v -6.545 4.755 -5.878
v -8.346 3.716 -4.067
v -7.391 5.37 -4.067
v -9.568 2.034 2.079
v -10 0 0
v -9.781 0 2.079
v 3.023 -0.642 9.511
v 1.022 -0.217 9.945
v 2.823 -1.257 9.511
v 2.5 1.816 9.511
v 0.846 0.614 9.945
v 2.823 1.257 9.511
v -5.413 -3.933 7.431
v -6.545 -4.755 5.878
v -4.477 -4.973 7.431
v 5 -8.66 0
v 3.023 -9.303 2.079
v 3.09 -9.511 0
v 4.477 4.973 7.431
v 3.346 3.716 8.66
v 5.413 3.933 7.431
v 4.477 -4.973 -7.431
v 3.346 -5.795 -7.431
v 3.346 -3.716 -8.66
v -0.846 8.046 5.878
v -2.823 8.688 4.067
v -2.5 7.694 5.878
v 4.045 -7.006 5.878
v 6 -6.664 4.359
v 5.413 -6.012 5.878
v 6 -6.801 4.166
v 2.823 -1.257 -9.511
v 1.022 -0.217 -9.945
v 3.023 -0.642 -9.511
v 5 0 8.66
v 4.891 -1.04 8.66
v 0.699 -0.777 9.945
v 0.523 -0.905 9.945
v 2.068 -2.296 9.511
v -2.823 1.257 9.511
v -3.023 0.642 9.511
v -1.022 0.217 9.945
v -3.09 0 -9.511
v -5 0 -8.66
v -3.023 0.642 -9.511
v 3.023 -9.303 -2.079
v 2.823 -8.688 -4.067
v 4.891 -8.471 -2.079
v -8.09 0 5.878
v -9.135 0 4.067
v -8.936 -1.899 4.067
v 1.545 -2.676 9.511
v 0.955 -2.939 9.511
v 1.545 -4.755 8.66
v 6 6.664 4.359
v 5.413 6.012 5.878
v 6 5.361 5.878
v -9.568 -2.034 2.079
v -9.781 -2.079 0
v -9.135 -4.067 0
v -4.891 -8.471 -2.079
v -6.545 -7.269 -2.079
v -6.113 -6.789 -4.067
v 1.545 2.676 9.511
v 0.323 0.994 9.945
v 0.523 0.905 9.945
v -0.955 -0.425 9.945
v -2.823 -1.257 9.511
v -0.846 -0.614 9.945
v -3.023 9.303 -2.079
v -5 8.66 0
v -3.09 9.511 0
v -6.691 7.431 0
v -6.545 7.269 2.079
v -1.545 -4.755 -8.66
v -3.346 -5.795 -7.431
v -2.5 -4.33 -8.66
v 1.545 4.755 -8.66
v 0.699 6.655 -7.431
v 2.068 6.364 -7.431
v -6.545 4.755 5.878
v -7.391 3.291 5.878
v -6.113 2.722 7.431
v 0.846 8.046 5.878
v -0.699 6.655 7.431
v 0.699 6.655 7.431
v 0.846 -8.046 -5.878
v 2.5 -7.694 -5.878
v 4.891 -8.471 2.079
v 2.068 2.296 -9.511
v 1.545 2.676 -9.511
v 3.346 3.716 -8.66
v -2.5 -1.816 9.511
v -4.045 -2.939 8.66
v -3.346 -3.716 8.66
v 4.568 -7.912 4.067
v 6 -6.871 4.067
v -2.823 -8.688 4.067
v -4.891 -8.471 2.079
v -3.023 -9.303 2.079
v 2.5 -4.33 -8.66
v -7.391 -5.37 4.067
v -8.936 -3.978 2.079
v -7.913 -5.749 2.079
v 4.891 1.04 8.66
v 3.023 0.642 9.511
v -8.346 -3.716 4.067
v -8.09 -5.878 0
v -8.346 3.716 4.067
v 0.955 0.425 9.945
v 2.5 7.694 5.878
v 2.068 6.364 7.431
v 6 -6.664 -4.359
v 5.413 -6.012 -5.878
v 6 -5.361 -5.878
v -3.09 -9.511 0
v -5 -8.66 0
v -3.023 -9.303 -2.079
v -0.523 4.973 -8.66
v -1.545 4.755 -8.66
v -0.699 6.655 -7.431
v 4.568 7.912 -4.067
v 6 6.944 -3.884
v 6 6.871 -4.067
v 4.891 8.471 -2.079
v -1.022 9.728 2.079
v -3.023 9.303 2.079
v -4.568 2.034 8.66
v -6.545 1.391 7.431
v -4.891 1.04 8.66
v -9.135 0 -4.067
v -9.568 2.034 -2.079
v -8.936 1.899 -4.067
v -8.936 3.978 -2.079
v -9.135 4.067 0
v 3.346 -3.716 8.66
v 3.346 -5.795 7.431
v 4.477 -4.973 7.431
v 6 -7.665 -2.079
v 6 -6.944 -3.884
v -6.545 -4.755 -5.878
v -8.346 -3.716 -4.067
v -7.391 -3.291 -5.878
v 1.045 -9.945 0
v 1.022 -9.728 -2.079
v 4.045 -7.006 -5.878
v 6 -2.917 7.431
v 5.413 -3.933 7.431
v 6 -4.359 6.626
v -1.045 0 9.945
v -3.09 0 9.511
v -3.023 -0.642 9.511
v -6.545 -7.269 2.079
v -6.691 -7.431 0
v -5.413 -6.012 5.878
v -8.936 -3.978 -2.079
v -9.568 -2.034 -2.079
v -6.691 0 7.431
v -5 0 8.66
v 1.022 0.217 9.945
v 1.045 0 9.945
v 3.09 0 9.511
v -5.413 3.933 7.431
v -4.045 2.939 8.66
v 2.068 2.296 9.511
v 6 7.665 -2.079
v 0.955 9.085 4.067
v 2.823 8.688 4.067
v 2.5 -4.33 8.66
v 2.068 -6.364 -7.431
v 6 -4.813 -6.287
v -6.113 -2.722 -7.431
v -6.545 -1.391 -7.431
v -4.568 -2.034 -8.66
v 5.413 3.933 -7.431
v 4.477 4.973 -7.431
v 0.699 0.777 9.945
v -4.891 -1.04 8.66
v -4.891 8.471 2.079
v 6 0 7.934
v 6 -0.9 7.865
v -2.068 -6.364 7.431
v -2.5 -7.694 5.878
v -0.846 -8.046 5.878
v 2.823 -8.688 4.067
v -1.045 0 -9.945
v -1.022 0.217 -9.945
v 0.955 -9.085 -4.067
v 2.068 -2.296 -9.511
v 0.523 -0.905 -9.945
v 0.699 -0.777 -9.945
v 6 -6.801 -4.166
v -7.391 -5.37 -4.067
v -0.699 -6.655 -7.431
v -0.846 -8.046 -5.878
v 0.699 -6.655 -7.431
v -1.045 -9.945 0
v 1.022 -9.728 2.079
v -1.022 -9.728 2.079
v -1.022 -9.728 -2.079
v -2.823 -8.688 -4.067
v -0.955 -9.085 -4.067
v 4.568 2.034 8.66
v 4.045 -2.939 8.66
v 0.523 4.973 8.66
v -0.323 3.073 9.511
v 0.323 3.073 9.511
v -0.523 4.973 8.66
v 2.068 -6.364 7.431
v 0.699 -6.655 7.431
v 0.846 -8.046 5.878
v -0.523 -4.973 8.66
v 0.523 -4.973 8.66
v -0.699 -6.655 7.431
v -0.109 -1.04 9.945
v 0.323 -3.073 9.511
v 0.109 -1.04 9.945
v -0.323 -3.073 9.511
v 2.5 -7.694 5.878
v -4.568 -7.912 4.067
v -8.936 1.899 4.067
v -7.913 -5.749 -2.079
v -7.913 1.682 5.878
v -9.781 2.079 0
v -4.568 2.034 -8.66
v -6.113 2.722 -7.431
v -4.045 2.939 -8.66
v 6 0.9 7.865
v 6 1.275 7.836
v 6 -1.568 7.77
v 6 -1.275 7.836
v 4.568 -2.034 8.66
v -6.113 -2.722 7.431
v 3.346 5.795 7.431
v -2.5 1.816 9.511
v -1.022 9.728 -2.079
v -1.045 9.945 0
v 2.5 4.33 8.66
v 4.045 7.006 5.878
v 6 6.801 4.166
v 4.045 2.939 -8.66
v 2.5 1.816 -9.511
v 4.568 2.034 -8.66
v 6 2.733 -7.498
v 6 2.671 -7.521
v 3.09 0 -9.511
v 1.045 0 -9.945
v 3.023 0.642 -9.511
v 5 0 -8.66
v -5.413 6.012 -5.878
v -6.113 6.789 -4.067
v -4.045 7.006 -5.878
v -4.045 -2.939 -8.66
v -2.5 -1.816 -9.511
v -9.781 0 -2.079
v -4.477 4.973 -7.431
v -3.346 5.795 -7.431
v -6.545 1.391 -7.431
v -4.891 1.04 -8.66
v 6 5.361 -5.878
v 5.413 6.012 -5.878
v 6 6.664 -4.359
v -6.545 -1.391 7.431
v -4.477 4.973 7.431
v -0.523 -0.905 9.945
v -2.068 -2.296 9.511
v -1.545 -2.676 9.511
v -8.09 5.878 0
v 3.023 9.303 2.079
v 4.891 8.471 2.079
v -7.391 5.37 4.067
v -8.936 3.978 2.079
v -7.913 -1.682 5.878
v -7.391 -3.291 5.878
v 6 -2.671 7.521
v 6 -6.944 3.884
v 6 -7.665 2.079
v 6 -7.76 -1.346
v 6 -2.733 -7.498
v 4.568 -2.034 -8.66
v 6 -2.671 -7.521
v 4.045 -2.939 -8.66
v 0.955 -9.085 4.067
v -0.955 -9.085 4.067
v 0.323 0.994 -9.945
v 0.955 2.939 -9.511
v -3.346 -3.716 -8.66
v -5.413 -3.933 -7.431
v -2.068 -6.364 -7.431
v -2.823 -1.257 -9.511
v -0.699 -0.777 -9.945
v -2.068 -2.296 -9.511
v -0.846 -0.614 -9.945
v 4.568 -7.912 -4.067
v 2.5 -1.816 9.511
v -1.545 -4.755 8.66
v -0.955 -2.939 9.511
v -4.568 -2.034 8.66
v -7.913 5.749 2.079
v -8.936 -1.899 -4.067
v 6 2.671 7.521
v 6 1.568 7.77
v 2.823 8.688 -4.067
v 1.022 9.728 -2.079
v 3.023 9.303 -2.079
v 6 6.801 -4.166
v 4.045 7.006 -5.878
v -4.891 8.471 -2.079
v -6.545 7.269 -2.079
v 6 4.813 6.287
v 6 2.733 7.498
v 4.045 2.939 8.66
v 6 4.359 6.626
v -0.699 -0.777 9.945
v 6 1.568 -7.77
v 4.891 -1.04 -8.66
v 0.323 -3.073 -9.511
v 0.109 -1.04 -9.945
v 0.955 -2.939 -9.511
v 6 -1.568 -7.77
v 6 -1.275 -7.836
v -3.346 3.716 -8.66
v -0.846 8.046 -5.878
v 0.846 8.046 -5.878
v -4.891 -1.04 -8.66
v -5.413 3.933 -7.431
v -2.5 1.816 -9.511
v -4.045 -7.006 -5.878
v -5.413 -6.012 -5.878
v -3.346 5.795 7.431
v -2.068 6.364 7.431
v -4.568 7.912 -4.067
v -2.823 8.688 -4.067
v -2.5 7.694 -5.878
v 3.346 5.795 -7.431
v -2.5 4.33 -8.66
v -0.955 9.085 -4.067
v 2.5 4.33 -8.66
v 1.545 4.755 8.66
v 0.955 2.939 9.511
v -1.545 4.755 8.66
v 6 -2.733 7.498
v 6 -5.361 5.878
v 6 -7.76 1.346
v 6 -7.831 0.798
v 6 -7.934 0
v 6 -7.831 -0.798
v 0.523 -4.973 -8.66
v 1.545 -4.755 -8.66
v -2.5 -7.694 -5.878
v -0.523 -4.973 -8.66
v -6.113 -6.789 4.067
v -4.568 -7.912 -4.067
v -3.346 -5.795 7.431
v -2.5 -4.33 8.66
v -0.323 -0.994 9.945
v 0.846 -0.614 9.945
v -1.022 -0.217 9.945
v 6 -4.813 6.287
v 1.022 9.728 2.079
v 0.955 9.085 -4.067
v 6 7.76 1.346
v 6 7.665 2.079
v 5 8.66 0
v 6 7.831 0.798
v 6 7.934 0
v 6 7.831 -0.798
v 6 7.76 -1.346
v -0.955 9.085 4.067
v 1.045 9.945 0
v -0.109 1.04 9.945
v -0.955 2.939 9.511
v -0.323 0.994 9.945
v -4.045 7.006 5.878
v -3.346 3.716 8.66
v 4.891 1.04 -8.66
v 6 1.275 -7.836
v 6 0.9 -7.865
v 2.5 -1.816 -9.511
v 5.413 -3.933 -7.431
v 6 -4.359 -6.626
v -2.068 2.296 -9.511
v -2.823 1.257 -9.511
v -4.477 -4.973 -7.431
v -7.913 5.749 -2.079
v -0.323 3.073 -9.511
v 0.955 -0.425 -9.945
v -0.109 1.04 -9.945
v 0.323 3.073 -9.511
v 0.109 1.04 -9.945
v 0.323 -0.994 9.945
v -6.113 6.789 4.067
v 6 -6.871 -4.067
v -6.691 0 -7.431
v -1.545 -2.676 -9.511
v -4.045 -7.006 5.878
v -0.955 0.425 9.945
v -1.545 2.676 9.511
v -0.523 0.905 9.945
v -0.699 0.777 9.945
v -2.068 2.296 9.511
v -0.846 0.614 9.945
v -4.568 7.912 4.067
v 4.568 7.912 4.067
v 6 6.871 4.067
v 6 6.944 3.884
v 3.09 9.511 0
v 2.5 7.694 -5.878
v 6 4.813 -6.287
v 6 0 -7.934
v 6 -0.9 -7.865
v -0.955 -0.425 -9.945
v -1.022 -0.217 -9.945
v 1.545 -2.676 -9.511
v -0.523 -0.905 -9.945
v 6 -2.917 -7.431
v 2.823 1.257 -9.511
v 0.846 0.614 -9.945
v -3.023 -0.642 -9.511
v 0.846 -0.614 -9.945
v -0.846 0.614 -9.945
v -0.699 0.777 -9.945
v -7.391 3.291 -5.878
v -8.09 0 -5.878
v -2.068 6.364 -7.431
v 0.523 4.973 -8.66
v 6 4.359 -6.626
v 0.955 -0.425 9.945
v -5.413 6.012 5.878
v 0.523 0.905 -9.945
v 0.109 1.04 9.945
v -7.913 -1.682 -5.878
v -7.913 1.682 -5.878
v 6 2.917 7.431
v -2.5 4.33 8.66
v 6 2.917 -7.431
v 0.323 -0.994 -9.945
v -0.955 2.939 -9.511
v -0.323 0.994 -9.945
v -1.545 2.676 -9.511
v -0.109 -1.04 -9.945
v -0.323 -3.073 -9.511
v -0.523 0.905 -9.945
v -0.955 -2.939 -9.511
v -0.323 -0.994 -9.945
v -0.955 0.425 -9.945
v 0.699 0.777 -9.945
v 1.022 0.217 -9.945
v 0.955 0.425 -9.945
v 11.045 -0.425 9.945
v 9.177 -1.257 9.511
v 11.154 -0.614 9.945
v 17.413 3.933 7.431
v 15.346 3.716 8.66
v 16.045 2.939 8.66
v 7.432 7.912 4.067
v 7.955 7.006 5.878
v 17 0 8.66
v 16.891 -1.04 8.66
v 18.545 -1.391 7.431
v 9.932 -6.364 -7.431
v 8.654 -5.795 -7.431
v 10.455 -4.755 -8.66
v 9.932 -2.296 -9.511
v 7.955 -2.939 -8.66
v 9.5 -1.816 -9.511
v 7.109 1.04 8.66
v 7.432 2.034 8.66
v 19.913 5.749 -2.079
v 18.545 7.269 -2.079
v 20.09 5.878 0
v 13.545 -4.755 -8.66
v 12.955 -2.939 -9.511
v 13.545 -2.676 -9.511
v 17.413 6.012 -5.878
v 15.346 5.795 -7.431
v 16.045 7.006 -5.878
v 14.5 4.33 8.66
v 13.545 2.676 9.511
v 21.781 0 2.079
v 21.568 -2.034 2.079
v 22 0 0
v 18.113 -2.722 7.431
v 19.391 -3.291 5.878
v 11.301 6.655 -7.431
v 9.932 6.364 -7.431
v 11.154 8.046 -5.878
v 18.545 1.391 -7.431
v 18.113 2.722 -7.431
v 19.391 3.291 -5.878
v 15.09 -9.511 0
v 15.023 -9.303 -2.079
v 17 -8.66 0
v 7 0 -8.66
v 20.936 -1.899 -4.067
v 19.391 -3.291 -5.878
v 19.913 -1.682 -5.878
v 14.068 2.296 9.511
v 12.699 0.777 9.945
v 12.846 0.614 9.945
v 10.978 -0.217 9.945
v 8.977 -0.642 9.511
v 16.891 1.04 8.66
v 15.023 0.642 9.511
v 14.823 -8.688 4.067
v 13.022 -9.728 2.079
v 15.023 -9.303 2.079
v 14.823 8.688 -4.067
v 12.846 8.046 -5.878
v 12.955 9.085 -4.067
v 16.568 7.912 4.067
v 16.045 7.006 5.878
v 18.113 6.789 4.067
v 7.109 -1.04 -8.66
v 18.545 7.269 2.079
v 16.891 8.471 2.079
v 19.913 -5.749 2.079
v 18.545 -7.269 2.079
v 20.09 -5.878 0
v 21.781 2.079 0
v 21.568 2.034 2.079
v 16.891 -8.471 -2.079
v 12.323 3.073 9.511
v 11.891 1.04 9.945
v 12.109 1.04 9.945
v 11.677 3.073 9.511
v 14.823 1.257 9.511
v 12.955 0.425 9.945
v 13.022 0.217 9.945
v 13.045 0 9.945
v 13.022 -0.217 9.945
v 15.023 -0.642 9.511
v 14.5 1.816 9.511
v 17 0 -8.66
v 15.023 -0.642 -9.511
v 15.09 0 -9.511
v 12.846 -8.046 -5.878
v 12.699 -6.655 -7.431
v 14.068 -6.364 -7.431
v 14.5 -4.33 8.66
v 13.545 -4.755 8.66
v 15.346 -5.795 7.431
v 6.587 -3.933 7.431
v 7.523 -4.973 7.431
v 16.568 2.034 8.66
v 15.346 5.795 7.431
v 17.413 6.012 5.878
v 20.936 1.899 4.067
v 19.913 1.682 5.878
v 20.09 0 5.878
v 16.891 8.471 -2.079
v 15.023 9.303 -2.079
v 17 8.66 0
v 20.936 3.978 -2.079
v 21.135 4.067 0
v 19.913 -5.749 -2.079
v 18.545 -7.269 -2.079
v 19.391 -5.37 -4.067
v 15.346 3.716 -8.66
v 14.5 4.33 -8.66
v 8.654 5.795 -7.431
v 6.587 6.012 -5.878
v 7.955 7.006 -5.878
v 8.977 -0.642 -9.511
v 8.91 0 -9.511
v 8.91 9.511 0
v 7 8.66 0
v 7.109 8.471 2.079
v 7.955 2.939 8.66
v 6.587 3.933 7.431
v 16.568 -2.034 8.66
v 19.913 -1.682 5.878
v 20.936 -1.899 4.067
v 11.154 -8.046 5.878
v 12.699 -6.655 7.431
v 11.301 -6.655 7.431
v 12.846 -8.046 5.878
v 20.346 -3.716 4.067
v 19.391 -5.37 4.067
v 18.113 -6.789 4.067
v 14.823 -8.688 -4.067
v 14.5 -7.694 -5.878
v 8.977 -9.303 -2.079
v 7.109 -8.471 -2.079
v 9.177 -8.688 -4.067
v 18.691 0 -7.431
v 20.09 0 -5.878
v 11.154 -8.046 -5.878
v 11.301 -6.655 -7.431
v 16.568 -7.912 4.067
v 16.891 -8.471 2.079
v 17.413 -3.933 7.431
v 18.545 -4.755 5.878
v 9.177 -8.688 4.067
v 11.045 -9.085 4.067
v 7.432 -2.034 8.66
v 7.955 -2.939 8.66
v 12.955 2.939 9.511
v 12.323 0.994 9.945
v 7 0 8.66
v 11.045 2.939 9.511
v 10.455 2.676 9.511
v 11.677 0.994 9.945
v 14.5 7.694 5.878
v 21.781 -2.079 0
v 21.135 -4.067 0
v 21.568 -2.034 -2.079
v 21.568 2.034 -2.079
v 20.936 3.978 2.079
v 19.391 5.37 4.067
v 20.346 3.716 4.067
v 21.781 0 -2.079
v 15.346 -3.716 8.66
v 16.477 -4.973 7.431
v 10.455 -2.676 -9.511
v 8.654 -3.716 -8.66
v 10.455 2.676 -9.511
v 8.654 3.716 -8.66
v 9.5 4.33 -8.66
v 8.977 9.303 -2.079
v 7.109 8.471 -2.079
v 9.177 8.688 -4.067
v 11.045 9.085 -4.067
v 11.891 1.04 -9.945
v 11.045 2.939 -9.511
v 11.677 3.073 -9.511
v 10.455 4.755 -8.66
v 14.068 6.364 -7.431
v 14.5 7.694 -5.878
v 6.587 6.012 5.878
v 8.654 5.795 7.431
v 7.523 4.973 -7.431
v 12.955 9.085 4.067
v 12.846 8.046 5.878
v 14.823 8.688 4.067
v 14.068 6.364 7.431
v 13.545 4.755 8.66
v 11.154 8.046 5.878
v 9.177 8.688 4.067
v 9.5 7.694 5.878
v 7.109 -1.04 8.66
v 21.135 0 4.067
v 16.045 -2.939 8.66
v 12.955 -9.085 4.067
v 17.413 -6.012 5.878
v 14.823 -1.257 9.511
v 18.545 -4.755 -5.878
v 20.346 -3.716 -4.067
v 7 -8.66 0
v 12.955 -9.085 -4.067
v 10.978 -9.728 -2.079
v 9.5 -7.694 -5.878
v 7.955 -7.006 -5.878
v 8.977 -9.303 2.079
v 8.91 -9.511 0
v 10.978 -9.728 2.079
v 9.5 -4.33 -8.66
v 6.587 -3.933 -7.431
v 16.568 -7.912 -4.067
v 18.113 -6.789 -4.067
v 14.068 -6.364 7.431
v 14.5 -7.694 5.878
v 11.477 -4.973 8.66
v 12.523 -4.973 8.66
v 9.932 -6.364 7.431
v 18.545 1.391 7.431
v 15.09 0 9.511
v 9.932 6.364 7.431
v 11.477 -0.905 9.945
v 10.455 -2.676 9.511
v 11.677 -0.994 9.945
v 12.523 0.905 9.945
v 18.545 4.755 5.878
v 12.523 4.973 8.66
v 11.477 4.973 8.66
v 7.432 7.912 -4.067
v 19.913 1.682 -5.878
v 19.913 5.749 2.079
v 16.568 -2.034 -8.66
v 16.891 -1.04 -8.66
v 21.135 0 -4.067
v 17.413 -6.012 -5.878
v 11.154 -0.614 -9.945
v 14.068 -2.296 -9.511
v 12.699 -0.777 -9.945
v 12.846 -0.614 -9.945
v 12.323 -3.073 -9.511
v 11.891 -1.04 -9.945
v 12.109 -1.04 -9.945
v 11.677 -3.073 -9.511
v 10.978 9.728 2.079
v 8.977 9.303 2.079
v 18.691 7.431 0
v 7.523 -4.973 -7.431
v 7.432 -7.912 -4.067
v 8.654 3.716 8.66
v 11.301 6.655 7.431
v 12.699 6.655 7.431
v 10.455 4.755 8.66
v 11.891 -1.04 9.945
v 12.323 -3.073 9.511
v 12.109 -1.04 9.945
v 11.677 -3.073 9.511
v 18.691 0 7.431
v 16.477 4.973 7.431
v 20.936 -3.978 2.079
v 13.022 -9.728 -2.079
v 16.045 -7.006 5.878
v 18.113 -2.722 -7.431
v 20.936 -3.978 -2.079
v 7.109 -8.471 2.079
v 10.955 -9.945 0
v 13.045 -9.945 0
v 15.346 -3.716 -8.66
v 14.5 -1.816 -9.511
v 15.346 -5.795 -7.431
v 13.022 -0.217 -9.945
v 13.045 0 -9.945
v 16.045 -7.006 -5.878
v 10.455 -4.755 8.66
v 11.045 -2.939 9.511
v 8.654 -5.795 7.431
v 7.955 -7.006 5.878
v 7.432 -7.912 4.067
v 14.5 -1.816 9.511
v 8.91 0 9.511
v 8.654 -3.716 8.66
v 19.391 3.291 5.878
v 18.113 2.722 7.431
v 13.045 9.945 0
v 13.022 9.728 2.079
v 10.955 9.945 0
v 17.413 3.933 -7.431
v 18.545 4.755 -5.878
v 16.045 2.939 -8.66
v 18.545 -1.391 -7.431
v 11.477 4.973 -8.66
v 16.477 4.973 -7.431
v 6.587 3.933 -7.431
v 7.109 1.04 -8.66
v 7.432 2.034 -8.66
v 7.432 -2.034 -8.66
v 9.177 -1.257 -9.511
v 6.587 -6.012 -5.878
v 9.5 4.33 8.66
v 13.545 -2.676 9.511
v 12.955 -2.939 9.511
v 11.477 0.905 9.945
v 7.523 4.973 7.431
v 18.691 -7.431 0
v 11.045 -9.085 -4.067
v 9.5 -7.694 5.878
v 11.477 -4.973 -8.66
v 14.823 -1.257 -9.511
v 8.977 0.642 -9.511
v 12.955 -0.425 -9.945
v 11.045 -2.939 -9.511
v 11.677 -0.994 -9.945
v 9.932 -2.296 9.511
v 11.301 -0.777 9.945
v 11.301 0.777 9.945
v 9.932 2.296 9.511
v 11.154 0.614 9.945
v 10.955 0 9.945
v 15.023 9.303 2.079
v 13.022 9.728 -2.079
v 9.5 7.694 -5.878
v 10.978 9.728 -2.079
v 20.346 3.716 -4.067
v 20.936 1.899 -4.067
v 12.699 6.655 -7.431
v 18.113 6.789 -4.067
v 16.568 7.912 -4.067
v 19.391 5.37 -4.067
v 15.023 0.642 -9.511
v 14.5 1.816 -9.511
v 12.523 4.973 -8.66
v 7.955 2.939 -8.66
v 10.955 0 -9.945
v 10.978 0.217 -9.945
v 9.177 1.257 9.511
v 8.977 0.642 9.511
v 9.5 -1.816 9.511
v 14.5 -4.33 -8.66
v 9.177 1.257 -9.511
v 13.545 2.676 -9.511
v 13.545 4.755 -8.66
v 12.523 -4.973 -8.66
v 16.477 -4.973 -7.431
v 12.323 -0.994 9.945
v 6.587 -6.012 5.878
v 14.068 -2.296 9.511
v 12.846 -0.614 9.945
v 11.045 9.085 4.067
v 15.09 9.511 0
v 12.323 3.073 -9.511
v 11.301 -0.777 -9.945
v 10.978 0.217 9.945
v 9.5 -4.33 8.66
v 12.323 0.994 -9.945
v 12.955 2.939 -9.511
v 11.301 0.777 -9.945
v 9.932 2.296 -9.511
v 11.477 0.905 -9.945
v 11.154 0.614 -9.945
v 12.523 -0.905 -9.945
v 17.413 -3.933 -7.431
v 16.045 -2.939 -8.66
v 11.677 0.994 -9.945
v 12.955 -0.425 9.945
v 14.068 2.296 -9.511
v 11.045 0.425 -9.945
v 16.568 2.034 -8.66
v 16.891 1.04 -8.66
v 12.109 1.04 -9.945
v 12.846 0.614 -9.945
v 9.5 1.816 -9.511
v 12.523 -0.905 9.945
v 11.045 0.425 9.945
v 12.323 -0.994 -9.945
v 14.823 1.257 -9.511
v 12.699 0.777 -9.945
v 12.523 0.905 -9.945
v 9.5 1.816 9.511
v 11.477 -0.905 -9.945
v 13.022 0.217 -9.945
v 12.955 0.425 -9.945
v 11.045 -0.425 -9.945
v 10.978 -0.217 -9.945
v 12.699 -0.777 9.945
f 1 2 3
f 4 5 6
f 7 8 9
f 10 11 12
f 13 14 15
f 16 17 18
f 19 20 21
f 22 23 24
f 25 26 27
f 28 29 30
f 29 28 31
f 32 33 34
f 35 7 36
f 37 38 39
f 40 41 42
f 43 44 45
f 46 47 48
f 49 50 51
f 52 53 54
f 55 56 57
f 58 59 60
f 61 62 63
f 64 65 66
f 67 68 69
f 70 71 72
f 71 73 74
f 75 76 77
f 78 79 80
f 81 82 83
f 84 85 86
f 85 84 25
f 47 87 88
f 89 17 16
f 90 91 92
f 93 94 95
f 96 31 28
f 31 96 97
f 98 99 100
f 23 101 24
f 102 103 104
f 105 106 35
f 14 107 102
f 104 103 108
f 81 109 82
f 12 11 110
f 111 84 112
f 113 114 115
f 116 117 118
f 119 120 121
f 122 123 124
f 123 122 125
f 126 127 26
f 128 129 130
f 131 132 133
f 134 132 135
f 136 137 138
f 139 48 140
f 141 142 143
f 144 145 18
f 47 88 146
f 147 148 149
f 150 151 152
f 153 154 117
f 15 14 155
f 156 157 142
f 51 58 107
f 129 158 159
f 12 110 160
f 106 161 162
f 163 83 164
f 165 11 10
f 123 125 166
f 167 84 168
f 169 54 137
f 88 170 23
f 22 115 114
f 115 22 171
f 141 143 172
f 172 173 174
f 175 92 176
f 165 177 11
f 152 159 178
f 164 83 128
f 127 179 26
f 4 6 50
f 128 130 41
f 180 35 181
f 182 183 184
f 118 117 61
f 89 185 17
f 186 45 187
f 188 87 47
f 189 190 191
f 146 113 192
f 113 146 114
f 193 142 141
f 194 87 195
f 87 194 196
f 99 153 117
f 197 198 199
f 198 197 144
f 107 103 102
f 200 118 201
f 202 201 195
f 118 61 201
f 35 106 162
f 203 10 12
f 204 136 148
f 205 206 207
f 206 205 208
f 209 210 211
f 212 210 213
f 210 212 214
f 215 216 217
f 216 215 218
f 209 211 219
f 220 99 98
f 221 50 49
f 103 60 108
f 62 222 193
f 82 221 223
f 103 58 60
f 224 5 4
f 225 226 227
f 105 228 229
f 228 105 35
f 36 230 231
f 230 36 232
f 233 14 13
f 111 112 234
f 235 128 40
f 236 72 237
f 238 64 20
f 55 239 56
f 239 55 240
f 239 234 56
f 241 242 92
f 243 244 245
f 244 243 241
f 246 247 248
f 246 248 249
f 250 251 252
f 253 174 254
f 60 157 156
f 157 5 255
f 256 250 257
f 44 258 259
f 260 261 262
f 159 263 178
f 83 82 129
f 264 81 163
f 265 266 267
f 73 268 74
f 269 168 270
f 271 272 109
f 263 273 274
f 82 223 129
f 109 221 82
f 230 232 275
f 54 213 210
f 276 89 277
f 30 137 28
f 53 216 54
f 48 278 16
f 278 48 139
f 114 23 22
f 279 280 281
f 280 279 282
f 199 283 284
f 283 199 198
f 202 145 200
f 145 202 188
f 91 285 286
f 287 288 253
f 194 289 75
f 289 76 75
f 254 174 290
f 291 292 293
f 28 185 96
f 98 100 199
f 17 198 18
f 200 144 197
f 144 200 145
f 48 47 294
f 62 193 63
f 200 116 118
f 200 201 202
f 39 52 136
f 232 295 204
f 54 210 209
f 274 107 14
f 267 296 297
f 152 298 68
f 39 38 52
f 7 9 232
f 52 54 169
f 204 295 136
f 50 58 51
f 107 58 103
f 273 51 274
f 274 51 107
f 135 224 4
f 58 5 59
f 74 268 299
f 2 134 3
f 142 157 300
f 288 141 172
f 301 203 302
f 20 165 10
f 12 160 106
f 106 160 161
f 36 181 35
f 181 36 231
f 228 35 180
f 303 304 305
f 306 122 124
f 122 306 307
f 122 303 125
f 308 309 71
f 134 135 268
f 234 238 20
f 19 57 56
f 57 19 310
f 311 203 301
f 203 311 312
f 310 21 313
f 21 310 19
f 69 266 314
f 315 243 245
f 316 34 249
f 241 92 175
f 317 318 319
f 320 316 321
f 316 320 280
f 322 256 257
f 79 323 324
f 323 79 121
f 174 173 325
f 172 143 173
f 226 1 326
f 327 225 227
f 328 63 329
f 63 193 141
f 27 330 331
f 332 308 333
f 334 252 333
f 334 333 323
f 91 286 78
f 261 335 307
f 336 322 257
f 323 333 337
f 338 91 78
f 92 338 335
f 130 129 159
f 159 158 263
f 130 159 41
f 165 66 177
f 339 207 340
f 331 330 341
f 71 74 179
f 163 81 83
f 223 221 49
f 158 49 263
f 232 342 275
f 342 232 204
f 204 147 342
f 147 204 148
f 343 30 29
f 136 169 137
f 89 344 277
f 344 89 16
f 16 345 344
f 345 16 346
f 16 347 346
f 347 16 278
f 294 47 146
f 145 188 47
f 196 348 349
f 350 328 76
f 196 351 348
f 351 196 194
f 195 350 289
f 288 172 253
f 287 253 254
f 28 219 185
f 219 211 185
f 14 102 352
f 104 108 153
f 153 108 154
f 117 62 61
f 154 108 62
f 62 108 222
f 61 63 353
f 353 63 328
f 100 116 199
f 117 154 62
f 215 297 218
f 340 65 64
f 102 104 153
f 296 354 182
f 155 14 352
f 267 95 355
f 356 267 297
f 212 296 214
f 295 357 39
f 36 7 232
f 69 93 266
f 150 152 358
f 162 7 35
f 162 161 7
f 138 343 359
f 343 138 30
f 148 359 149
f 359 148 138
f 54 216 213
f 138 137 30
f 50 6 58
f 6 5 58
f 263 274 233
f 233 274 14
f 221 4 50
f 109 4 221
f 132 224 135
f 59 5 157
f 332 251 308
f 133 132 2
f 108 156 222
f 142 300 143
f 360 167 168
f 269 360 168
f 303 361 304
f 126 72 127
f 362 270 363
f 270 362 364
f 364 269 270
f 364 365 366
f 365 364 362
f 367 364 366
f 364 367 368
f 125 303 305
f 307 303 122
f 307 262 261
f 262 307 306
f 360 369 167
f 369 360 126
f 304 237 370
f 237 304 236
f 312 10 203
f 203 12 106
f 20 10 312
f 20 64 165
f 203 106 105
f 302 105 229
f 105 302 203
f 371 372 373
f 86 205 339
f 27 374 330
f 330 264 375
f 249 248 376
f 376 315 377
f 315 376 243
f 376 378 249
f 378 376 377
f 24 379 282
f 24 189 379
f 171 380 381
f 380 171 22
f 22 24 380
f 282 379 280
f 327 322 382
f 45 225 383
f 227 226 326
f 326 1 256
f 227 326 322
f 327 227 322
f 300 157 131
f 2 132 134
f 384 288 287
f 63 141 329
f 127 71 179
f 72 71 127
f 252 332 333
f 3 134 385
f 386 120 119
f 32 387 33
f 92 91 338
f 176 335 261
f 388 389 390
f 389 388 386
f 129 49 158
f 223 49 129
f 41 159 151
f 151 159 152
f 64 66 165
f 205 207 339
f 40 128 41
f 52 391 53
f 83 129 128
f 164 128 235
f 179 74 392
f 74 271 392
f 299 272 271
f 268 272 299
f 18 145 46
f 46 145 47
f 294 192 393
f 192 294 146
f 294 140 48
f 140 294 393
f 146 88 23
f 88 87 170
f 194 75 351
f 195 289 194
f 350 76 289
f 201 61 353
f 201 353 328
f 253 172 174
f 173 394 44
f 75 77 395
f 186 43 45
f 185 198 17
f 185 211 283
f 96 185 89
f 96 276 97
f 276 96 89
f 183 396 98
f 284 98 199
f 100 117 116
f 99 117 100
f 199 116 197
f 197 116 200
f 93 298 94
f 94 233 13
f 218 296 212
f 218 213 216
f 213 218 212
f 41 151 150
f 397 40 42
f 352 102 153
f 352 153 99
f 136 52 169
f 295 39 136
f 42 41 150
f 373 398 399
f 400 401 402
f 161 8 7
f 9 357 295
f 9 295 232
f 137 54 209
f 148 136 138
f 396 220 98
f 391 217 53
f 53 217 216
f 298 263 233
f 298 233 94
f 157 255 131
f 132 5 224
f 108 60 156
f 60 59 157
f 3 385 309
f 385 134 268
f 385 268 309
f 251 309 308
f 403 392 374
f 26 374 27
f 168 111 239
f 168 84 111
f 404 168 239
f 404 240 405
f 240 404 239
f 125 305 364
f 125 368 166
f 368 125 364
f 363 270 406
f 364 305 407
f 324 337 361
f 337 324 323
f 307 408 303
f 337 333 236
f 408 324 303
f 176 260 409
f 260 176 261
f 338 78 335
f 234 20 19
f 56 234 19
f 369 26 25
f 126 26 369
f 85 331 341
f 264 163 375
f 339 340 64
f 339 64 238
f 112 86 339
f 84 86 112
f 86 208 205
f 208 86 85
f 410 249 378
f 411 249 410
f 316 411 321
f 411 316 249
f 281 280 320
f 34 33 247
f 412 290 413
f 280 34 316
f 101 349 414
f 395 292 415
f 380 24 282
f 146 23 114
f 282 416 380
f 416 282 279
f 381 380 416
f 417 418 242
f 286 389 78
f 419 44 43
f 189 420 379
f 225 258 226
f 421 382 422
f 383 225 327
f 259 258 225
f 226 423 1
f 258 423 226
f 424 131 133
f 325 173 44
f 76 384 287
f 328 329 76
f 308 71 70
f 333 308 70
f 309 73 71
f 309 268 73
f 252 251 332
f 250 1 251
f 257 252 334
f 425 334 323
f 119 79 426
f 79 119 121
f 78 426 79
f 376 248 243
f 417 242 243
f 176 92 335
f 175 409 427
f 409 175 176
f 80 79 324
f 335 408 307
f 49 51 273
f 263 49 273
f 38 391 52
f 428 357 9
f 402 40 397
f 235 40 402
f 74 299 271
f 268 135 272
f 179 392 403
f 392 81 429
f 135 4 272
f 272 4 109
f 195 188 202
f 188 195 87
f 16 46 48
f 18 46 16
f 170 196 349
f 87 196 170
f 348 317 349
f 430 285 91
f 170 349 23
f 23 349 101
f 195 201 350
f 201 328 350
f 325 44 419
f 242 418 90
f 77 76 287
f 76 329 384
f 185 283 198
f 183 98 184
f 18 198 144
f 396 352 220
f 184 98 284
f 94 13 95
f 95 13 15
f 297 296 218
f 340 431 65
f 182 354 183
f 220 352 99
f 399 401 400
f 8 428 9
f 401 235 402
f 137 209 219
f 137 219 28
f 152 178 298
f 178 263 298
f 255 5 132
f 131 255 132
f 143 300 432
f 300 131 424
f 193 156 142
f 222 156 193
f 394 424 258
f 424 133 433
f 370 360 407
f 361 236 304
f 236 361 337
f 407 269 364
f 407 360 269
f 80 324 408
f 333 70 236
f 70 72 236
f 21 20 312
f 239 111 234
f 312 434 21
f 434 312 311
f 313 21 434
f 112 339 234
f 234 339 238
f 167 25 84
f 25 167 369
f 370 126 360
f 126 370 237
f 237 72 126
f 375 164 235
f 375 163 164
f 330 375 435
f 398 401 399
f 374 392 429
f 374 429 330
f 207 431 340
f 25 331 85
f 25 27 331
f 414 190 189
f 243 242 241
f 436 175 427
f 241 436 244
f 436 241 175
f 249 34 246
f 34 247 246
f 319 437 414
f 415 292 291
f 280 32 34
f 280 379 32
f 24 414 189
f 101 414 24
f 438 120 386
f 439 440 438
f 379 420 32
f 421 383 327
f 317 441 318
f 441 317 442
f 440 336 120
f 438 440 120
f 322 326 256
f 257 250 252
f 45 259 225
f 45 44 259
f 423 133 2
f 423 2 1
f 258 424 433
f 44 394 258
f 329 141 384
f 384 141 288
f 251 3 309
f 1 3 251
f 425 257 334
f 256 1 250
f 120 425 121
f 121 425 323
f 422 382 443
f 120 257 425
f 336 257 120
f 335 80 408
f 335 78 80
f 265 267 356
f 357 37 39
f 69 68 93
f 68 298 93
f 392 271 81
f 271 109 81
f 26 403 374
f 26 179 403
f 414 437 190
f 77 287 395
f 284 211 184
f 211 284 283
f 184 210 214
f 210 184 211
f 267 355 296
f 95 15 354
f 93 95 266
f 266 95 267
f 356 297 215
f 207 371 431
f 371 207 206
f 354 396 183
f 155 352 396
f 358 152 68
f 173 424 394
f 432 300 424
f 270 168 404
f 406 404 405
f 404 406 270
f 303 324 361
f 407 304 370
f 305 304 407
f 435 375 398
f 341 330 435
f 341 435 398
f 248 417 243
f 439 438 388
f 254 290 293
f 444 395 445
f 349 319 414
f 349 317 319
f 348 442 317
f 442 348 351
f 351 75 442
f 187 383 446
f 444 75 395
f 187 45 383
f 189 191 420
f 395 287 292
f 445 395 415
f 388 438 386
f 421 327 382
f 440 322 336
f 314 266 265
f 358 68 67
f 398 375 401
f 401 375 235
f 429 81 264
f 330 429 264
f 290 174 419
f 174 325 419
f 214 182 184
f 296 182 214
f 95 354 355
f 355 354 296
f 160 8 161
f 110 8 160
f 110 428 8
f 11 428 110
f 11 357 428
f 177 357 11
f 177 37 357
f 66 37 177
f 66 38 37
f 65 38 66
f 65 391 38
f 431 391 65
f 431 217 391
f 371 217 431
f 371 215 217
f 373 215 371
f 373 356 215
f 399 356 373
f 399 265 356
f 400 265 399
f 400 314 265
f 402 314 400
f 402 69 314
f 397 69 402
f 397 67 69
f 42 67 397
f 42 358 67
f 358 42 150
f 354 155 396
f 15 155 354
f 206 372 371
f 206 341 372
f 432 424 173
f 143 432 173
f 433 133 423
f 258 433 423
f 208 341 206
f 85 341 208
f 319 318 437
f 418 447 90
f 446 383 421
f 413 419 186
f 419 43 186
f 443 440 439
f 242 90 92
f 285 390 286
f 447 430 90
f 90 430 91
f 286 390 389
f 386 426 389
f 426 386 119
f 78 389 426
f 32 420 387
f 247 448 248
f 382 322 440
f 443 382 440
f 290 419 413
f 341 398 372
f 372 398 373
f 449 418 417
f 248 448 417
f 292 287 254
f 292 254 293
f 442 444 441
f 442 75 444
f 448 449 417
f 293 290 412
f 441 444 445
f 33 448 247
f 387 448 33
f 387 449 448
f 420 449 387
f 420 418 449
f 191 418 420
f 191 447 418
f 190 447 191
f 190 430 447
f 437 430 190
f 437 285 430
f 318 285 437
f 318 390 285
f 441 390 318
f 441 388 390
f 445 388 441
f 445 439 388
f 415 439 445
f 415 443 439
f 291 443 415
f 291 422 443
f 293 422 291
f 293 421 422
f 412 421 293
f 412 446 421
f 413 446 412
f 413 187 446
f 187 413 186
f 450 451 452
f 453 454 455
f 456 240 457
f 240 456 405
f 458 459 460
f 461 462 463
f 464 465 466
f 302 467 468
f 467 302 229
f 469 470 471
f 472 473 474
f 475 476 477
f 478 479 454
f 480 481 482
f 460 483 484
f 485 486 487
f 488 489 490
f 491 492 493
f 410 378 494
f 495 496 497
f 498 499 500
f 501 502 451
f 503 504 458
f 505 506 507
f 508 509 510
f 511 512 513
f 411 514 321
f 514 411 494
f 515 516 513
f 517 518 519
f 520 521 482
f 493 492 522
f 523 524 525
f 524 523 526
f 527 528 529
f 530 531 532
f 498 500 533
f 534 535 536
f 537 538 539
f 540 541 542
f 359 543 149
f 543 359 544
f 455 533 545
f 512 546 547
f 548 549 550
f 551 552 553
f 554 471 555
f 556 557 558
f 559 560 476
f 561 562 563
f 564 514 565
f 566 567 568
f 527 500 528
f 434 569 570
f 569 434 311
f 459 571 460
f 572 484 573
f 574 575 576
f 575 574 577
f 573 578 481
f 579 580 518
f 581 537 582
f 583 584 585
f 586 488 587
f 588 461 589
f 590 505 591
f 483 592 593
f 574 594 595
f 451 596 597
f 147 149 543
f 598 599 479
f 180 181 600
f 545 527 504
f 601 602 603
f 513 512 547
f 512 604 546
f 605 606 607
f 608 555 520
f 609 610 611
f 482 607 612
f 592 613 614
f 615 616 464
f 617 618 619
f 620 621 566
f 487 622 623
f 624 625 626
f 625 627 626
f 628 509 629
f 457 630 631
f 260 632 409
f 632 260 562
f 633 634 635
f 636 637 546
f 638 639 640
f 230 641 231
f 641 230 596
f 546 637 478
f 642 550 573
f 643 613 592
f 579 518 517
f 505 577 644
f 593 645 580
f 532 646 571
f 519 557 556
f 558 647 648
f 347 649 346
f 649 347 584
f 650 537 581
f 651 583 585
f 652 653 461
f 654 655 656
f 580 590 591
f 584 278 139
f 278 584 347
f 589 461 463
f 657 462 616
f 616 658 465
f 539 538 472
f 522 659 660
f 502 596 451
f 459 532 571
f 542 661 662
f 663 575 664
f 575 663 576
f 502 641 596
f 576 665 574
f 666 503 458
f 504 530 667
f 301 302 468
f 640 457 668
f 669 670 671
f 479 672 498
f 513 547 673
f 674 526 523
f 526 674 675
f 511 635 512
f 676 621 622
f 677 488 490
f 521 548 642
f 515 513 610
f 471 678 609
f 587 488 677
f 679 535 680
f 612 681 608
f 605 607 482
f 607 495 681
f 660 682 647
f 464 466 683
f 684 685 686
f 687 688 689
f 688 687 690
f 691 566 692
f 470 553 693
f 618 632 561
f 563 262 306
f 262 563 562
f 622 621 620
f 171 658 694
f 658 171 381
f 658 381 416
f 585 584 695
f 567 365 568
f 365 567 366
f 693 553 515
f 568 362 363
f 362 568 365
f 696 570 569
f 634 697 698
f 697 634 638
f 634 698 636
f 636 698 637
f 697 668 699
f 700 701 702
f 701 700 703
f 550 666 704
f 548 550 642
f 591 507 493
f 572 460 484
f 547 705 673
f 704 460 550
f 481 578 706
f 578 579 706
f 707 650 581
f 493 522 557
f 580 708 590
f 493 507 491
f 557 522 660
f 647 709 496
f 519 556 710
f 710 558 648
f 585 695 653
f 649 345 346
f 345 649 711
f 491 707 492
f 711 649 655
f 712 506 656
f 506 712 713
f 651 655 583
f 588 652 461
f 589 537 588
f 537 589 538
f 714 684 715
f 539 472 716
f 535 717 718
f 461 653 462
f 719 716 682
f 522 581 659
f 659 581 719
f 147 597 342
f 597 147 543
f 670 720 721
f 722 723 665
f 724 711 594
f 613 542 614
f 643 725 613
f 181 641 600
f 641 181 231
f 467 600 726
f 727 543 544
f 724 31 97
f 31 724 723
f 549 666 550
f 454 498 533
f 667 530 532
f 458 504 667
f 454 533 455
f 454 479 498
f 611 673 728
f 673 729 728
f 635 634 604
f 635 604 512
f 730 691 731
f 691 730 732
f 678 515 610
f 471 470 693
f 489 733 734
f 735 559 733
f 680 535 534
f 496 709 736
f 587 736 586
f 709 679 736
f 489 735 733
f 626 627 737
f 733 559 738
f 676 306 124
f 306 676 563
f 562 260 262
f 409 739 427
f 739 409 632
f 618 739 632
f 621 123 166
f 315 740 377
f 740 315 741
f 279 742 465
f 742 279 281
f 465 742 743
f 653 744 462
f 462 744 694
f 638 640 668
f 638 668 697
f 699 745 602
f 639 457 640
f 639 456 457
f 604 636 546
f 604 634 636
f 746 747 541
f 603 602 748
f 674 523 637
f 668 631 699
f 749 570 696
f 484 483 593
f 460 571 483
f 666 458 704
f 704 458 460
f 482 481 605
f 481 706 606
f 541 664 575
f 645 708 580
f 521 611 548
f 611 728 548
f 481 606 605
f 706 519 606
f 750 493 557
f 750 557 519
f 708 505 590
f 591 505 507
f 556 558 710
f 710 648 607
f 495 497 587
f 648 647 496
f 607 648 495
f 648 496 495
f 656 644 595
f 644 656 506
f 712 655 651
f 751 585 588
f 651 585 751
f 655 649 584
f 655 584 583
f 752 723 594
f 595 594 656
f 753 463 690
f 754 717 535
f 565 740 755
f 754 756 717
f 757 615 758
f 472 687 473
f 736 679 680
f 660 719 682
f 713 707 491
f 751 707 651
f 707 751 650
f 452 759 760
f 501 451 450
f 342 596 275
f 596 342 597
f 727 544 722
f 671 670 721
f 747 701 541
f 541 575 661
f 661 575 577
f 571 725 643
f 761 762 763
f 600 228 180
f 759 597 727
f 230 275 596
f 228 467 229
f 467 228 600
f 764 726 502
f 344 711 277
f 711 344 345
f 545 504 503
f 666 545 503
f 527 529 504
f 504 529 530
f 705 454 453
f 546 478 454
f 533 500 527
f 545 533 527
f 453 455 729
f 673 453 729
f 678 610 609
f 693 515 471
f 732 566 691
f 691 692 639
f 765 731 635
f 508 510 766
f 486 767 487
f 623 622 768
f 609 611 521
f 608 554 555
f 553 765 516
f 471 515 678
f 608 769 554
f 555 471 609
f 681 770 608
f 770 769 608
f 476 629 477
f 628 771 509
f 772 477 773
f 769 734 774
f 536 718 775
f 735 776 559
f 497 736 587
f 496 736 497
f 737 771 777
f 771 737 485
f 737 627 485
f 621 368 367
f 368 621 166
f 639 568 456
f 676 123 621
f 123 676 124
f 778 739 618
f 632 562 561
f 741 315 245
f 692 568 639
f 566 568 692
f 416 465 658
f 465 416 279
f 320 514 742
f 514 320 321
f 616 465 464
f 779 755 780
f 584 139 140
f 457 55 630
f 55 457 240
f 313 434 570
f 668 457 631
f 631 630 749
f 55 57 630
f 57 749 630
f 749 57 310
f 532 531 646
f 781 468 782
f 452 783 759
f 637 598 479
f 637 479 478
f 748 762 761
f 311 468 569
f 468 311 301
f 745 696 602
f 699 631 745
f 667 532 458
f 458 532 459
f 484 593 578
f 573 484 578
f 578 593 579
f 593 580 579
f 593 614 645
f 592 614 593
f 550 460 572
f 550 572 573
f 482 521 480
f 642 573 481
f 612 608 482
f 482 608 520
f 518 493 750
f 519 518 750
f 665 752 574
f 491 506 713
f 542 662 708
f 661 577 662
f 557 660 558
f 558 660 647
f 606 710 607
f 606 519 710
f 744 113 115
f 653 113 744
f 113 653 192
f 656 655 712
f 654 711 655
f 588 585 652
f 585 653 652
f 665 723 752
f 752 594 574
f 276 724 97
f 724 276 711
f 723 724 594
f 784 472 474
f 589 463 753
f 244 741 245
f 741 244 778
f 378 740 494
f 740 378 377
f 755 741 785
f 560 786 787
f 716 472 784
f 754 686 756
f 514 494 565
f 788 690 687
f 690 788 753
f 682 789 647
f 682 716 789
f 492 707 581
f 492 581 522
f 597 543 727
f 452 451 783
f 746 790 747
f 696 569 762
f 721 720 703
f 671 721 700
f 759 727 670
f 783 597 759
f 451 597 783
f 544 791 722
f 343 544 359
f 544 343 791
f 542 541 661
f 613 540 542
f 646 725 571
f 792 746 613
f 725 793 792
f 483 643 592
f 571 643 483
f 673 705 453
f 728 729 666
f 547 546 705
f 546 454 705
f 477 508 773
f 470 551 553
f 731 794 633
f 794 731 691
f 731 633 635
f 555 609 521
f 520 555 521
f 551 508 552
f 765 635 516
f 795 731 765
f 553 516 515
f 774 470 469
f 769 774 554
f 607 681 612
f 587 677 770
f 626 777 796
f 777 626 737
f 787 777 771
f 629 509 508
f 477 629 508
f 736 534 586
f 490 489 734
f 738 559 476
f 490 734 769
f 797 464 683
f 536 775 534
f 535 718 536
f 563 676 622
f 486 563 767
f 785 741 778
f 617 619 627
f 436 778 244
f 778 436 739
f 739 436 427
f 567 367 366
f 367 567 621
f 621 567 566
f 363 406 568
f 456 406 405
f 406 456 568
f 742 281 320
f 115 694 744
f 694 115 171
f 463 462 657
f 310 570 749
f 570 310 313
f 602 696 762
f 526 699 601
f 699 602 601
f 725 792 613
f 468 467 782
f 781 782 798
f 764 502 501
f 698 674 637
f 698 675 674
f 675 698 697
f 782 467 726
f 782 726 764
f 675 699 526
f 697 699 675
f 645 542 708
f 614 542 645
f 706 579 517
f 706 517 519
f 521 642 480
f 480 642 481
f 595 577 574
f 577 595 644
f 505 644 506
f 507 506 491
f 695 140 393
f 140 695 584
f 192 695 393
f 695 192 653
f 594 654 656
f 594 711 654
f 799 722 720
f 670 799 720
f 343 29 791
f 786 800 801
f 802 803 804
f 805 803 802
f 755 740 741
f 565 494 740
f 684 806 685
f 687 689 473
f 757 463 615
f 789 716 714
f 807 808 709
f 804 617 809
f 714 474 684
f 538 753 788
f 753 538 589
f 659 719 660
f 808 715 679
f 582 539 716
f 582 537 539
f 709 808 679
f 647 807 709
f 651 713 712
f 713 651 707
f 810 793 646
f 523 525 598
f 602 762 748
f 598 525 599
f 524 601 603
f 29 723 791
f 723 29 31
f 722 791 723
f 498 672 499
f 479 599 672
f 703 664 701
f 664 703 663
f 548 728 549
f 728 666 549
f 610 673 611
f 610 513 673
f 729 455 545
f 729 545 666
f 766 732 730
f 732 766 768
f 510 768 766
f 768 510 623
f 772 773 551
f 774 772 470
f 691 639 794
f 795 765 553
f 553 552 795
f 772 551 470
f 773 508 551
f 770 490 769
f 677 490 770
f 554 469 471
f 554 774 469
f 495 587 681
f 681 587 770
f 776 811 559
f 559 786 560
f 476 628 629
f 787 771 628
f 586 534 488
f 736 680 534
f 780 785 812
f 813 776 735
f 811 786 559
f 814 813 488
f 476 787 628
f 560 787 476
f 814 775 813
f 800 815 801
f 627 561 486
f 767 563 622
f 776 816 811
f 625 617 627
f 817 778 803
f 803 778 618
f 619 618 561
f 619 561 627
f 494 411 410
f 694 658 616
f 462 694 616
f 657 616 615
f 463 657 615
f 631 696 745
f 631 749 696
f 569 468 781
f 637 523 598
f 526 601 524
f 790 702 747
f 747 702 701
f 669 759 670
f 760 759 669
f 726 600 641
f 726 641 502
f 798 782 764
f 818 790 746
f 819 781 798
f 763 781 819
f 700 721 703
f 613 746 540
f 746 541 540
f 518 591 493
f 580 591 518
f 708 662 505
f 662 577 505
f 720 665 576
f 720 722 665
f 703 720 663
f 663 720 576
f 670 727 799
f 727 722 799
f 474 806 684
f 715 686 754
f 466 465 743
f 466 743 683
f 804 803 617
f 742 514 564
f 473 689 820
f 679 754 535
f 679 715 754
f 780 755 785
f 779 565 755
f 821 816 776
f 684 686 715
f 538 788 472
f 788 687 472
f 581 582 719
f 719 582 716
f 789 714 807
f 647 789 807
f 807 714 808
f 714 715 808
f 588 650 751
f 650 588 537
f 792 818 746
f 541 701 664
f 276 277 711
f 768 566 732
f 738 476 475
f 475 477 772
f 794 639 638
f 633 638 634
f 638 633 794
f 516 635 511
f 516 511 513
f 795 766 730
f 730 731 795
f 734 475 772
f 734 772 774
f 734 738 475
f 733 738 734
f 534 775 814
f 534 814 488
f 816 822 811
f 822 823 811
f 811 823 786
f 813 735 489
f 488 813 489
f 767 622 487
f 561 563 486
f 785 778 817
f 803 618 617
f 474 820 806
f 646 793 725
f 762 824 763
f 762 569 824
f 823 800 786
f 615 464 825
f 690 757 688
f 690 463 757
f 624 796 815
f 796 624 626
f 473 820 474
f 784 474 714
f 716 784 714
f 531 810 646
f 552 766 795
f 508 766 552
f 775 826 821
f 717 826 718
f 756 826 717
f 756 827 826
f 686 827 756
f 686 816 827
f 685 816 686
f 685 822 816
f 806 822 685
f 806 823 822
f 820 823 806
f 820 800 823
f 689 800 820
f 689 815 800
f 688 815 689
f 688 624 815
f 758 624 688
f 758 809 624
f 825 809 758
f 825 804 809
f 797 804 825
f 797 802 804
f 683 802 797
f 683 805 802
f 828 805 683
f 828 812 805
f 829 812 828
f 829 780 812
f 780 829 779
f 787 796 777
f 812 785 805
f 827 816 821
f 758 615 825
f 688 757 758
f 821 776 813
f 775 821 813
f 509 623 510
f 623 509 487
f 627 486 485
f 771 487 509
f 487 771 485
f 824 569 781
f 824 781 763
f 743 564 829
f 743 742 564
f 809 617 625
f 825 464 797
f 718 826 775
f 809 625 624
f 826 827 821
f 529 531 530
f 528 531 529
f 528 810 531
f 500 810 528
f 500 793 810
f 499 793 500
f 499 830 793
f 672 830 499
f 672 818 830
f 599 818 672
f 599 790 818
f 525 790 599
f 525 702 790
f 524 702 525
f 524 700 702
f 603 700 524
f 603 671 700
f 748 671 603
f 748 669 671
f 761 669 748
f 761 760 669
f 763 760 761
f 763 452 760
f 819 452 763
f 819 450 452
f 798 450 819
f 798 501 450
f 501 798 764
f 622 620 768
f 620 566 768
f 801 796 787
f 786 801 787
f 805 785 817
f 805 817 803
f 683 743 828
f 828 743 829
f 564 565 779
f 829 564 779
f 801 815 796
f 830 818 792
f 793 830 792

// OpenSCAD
union() {
    sphere(r=10);
    translate([12,0,0])
        sphere(r=10);
}
